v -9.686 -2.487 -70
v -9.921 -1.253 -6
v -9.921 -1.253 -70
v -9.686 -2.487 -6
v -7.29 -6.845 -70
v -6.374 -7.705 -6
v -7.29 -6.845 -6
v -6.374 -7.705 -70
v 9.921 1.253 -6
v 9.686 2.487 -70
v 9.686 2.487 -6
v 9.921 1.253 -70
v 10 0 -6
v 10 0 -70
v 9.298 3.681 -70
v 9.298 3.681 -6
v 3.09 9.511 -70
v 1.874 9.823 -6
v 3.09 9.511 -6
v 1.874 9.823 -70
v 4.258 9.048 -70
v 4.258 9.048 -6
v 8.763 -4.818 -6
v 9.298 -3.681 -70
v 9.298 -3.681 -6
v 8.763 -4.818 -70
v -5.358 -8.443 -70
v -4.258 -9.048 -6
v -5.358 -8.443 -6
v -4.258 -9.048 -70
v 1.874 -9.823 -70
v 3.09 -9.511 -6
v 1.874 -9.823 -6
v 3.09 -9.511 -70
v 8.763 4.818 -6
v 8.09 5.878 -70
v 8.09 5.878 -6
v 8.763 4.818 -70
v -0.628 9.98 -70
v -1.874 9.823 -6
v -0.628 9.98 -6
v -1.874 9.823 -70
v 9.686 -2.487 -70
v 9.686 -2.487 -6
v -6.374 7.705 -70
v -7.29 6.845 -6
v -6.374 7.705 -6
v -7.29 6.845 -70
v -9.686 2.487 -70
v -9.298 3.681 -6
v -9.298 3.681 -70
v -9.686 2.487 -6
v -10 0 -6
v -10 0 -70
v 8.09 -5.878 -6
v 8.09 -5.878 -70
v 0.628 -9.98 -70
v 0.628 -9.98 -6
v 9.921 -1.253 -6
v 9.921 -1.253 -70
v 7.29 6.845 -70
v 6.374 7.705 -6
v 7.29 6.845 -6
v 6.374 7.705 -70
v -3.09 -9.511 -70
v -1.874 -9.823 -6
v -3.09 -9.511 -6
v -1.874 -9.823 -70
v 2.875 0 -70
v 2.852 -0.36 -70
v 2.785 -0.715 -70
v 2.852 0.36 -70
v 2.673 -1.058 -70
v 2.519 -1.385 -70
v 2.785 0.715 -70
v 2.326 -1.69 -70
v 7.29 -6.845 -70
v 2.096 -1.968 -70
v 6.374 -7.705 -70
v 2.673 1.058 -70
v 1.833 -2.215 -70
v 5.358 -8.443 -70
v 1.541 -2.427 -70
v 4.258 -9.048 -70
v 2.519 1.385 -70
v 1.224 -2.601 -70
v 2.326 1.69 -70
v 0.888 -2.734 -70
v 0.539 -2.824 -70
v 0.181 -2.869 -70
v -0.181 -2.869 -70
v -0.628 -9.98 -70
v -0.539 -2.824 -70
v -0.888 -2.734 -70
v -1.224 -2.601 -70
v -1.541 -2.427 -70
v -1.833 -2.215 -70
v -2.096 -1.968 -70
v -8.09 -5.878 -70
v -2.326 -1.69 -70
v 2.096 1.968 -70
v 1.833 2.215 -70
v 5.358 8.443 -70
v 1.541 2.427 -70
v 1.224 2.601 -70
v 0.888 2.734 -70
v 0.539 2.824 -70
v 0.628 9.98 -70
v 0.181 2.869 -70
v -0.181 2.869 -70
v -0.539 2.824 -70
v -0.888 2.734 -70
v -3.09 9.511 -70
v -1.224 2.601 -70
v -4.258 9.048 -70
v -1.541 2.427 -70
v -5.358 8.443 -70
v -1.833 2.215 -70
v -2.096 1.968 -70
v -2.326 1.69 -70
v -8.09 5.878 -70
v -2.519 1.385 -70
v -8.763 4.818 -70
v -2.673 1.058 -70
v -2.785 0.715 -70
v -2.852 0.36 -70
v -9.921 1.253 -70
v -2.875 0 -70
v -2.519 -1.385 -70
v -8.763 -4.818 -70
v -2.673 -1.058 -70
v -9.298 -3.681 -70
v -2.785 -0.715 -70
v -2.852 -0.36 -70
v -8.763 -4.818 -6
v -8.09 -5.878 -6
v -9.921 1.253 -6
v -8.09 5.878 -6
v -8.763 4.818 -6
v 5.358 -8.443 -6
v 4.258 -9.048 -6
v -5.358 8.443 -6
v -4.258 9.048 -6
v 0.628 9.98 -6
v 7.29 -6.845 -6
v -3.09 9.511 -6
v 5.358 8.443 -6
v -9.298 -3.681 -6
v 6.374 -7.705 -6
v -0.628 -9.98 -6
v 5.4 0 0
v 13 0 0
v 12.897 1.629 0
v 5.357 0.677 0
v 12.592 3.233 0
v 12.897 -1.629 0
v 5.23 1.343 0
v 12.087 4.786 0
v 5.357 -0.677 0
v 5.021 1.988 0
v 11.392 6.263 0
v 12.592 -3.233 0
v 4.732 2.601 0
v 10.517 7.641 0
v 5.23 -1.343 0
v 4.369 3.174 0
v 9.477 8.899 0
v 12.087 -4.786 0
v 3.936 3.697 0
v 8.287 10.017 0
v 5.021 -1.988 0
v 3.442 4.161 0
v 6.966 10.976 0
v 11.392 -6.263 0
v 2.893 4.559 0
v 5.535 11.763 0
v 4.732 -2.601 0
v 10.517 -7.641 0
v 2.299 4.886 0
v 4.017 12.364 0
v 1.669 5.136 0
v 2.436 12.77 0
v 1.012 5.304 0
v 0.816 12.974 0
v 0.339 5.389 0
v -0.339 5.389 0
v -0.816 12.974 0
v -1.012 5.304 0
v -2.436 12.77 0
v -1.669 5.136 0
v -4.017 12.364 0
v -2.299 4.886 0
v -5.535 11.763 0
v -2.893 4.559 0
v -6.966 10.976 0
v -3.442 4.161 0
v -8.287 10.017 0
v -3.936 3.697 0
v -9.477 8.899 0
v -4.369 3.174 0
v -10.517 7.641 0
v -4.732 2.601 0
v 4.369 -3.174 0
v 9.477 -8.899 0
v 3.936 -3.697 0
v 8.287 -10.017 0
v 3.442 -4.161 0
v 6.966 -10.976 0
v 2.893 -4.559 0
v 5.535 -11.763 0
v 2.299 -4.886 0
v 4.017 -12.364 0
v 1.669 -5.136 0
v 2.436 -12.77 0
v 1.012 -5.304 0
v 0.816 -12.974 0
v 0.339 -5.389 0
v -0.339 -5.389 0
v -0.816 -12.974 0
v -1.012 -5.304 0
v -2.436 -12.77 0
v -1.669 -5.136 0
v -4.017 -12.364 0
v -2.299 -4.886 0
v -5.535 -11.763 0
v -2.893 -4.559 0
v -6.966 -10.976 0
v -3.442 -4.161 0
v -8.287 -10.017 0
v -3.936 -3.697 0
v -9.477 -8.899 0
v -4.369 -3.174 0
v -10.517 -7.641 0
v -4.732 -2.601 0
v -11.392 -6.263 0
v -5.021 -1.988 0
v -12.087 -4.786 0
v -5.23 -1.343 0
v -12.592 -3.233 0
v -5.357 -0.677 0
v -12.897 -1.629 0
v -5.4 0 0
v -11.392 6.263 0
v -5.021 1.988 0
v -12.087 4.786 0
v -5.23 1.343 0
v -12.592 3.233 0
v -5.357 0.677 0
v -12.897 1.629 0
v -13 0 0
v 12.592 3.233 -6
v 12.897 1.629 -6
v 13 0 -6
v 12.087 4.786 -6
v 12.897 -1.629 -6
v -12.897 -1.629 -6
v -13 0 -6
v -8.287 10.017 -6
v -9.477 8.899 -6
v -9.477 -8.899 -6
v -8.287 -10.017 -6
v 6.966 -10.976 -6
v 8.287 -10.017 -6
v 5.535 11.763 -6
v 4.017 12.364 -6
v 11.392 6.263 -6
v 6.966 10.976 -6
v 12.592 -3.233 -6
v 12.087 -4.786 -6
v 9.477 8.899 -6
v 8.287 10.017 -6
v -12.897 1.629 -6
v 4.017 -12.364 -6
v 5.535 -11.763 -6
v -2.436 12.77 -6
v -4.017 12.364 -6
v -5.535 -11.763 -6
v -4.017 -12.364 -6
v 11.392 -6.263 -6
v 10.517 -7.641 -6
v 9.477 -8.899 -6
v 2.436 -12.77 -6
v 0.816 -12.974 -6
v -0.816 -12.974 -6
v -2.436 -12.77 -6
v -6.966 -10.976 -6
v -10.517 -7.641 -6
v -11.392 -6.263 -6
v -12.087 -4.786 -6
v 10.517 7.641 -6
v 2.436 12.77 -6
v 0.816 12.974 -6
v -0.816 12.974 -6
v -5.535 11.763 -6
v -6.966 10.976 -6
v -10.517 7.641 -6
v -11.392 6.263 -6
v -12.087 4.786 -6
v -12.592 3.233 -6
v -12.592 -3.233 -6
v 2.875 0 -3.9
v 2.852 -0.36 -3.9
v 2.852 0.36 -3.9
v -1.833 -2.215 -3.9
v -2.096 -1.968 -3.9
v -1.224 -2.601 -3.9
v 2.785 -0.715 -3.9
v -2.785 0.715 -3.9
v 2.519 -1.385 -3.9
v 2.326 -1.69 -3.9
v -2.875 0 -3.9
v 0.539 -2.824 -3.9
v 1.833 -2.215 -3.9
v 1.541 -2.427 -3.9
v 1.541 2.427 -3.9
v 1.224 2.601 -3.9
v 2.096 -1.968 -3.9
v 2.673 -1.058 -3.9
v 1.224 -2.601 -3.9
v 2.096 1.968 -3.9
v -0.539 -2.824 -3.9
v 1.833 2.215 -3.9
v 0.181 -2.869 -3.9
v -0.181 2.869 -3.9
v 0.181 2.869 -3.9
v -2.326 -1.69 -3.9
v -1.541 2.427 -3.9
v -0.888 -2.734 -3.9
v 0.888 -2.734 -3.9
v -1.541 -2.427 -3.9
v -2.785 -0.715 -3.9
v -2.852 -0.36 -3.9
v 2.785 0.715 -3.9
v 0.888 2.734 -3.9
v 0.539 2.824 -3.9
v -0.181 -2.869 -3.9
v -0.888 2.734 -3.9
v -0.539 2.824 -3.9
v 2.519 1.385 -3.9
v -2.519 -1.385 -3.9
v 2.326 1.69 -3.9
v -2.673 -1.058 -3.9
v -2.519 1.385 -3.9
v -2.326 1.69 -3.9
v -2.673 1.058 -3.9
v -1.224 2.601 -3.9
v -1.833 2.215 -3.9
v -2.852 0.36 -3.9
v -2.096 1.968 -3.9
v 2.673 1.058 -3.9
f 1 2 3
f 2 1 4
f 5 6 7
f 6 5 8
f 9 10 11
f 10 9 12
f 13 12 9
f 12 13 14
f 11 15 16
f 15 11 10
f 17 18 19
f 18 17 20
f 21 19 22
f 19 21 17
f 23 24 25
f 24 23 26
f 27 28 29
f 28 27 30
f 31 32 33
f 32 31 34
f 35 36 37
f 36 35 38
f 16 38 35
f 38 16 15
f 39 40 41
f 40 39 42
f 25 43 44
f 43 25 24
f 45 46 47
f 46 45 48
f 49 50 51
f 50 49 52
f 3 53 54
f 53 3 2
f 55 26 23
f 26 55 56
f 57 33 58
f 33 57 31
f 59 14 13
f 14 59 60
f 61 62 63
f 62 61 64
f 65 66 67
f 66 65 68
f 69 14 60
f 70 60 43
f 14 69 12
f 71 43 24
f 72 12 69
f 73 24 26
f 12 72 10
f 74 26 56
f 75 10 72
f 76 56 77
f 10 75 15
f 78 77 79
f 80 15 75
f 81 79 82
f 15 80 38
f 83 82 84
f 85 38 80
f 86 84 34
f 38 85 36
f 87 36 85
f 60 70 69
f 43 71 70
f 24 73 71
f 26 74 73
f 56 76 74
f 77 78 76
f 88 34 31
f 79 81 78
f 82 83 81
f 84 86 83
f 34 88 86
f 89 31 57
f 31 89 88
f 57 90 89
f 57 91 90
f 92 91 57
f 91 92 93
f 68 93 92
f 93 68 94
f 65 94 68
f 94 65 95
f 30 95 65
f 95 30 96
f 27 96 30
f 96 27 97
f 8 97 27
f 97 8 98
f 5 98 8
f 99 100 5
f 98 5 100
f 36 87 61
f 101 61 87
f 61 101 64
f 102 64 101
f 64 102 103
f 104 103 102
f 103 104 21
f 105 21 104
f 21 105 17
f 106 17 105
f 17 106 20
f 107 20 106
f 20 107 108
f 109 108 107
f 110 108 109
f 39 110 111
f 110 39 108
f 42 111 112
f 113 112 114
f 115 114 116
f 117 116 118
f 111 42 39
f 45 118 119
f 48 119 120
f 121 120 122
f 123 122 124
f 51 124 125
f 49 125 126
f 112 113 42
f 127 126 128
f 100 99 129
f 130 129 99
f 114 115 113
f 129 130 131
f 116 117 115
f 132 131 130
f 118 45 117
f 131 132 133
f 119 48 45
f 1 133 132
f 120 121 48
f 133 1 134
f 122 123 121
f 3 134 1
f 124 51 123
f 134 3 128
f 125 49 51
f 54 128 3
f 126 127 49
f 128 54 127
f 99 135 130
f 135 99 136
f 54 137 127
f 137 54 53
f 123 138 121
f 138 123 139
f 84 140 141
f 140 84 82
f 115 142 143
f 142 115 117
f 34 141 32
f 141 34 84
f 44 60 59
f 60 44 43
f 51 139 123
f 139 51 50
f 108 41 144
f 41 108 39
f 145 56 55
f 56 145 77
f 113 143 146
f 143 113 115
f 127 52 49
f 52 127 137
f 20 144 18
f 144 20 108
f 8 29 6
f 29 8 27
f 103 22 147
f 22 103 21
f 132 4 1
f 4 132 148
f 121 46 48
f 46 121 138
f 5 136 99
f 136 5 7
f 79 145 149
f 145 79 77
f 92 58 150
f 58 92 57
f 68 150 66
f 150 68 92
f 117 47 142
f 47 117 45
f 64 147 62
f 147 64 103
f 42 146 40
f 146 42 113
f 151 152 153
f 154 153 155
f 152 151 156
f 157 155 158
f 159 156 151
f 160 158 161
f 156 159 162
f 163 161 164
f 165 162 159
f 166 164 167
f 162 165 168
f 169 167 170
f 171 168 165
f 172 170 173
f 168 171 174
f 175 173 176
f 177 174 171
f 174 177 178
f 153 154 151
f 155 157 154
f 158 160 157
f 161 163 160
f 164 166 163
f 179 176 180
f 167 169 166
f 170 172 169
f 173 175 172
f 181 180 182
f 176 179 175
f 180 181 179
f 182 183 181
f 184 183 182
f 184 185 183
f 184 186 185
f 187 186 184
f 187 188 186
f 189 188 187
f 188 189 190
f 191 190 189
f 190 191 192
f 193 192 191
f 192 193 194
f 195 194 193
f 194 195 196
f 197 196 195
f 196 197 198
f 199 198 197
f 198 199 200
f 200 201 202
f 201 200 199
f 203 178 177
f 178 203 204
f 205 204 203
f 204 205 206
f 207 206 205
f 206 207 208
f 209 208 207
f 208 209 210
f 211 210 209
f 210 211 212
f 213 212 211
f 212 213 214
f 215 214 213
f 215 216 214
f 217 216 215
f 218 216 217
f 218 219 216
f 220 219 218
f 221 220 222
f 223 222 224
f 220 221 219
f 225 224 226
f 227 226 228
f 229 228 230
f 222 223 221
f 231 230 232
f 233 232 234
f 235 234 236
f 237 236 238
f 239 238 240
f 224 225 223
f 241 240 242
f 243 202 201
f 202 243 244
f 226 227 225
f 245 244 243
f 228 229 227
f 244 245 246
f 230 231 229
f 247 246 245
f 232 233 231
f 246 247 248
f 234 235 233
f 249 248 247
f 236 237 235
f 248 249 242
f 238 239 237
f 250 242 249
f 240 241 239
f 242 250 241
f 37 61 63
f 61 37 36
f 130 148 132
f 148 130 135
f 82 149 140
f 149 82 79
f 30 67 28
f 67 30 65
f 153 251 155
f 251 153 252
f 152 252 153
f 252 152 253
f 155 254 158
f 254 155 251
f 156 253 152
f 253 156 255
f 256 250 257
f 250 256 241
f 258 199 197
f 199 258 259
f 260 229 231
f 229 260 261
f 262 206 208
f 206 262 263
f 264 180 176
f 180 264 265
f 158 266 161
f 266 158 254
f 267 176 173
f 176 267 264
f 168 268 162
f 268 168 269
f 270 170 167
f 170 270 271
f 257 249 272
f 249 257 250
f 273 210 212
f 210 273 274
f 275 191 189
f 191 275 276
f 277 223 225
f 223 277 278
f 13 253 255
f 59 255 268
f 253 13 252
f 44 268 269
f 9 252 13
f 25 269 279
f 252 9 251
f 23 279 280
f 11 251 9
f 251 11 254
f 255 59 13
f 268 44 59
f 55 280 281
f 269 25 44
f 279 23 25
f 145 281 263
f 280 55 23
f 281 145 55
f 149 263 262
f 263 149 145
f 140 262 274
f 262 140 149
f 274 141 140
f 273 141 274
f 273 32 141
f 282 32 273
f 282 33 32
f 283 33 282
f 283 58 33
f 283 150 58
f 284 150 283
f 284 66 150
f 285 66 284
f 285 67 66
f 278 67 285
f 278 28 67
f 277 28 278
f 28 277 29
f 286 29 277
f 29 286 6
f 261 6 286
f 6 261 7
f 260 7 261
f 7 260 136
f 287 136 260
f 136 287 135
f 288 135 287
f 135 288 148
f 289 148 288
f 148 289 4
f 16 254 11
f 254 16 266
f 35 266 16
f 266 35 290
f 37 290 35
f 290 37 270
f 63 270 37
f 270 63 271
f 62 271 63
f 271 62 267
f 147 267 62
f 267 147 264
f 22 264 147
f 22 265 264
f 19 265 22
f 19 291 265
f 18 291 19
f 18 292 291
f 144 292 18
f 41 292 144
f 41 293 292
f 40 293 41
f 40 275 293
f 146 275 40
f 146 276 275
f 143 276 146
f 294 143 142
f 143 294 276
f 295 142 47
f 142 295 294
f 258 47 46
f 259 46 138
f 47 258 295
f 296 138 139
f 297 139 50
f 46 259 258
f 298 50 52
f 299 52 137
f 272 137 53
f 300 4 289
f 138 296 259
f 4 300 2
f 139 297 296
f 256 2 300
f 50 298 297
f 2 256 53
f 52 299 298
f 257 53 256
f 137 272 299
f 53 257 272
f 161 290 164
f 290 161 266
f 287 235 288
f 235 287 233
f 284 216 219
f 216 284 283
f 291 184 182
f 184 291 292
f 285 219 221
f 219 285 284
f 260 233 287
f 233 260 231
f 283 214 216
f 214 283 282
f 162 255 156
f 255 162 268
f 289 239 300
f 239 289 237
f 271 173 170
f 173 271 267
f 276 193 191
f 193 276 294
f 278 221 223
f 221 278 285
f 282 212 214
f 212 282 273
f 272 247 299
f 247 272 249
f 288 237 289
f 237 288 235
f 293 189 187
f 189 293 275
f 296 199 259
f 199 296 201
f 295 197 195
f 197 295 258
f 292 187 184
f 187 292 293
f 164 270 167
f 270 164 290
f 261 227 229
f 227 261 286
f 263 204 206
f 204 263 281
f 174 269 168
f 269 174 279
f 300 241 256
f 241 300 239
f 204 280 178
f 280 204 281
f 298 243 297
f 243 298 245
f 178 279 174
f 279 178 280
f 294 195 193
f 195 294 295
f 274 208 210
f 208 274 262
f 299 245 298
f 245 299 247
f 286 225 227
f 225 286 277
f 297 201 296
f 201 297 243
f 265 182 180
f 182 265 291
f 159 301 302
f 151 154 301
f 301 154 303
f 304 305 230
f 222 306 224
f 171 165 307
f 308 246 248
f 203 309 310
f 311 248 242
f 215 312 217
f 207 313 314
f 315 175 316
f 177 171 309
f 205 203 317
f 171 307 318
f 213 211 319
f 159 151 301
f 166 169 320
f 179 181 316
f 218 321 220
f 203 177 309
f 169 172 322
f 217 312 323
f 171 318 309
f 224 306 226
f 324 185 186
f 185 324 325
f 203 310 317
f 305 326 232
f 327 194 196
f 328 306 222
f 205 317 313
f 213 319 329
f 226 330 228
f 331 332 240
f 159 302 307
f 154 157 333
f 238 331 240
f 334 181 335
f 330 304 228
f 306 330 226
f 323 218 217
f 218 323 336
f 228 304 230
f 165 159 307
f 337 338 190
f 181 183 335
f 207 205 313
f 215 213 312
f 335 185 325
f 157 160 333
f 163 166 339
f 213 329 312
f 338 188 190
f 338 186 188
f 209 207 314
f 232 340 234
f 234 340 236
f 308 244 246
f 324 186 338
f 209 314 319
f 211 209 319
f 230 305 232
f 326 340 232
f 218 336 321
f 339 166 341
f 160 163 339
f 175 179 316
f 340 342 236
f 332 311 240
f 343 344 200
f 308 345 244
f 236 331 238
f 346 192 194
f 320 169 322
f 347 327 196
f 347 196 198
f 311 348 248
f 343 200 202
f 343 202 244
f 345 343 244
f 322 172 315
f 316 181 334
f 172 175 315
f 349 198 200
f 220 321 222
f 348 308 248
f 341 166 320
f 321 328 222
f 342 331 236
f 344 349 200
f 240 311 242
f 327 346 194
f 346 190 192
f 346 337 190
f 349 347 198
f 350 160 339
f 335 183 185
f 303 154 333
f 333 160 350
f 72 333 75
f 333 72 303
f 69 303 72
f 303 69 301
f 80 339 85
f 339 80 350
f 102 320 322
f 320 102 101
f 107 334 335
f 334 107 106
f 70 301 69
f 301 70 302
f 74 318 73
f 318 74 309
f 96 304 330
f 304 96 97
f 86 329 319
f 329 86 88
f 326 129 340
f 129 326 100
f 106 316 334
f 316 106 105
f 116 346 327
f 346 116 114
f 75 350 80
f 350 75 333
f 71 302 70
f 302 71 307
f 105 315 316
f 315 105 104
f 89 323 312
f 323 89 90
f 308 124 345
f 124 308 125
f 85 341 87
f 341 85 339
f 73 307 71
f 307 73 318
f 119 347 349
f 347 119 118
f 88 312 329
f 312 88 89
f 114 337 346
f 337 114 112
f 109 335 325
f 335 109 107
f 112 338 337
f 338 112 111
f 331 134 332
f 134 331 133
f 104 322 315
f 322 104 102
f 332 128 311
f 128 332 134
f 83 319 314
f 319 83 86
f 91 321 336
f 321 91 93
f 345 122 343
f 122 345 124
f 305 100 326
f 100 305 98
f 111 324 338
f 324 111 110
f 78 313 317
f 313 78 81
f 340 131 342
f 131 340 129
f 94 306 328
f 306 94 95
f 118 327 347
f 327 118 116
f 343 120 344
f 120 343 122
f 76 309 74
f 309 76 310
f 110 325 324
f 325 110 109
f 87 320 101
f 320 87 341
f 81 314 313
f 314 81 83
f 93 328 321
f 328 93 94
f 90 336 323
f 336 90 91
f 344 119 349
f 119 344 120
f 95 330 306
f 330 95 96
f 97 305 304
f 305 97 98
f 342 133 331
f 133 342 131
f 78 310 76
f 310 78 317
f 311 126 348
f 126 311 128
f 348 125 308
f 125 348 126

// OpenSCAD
$fn = 50;


difference() {
	union() {
		translate(v = [0, 0, -70.0000000000]) {
			cylinder(h = 70, r = 10.0000000000);
		}
		translate(v = [0, 0, -6.0000000000]) {
			cylinder(h = 6, r = 13.0000000000);
		}
	}
	union() {
		translate(v = [0, 0, 0]) {
			rotate(a = [0, 0, 0]) {
				difference() {
					union() {
						#translate(v = [0, 0, -70.0000000000]) {
							cylinder(h = 70, r = 2.6000000000);
						}
						#translate(v = [0, 0, -3.9000000000]) {
							cylinder(h = 3.9000000000, r1 = 2.8750000000, r2 = 5.4000000000);
						}
						#translate(v = [0, 0, -70.0000000000]) {
							cylinder(h = 70, r = 2.8750000000);
						}
						#translate(v = [0, 0, -70.0000000000]) {
							cylinder(h = 70, r = 2.6000000000);
						}
					}
					union();
				}
			}
		}
	}
}
